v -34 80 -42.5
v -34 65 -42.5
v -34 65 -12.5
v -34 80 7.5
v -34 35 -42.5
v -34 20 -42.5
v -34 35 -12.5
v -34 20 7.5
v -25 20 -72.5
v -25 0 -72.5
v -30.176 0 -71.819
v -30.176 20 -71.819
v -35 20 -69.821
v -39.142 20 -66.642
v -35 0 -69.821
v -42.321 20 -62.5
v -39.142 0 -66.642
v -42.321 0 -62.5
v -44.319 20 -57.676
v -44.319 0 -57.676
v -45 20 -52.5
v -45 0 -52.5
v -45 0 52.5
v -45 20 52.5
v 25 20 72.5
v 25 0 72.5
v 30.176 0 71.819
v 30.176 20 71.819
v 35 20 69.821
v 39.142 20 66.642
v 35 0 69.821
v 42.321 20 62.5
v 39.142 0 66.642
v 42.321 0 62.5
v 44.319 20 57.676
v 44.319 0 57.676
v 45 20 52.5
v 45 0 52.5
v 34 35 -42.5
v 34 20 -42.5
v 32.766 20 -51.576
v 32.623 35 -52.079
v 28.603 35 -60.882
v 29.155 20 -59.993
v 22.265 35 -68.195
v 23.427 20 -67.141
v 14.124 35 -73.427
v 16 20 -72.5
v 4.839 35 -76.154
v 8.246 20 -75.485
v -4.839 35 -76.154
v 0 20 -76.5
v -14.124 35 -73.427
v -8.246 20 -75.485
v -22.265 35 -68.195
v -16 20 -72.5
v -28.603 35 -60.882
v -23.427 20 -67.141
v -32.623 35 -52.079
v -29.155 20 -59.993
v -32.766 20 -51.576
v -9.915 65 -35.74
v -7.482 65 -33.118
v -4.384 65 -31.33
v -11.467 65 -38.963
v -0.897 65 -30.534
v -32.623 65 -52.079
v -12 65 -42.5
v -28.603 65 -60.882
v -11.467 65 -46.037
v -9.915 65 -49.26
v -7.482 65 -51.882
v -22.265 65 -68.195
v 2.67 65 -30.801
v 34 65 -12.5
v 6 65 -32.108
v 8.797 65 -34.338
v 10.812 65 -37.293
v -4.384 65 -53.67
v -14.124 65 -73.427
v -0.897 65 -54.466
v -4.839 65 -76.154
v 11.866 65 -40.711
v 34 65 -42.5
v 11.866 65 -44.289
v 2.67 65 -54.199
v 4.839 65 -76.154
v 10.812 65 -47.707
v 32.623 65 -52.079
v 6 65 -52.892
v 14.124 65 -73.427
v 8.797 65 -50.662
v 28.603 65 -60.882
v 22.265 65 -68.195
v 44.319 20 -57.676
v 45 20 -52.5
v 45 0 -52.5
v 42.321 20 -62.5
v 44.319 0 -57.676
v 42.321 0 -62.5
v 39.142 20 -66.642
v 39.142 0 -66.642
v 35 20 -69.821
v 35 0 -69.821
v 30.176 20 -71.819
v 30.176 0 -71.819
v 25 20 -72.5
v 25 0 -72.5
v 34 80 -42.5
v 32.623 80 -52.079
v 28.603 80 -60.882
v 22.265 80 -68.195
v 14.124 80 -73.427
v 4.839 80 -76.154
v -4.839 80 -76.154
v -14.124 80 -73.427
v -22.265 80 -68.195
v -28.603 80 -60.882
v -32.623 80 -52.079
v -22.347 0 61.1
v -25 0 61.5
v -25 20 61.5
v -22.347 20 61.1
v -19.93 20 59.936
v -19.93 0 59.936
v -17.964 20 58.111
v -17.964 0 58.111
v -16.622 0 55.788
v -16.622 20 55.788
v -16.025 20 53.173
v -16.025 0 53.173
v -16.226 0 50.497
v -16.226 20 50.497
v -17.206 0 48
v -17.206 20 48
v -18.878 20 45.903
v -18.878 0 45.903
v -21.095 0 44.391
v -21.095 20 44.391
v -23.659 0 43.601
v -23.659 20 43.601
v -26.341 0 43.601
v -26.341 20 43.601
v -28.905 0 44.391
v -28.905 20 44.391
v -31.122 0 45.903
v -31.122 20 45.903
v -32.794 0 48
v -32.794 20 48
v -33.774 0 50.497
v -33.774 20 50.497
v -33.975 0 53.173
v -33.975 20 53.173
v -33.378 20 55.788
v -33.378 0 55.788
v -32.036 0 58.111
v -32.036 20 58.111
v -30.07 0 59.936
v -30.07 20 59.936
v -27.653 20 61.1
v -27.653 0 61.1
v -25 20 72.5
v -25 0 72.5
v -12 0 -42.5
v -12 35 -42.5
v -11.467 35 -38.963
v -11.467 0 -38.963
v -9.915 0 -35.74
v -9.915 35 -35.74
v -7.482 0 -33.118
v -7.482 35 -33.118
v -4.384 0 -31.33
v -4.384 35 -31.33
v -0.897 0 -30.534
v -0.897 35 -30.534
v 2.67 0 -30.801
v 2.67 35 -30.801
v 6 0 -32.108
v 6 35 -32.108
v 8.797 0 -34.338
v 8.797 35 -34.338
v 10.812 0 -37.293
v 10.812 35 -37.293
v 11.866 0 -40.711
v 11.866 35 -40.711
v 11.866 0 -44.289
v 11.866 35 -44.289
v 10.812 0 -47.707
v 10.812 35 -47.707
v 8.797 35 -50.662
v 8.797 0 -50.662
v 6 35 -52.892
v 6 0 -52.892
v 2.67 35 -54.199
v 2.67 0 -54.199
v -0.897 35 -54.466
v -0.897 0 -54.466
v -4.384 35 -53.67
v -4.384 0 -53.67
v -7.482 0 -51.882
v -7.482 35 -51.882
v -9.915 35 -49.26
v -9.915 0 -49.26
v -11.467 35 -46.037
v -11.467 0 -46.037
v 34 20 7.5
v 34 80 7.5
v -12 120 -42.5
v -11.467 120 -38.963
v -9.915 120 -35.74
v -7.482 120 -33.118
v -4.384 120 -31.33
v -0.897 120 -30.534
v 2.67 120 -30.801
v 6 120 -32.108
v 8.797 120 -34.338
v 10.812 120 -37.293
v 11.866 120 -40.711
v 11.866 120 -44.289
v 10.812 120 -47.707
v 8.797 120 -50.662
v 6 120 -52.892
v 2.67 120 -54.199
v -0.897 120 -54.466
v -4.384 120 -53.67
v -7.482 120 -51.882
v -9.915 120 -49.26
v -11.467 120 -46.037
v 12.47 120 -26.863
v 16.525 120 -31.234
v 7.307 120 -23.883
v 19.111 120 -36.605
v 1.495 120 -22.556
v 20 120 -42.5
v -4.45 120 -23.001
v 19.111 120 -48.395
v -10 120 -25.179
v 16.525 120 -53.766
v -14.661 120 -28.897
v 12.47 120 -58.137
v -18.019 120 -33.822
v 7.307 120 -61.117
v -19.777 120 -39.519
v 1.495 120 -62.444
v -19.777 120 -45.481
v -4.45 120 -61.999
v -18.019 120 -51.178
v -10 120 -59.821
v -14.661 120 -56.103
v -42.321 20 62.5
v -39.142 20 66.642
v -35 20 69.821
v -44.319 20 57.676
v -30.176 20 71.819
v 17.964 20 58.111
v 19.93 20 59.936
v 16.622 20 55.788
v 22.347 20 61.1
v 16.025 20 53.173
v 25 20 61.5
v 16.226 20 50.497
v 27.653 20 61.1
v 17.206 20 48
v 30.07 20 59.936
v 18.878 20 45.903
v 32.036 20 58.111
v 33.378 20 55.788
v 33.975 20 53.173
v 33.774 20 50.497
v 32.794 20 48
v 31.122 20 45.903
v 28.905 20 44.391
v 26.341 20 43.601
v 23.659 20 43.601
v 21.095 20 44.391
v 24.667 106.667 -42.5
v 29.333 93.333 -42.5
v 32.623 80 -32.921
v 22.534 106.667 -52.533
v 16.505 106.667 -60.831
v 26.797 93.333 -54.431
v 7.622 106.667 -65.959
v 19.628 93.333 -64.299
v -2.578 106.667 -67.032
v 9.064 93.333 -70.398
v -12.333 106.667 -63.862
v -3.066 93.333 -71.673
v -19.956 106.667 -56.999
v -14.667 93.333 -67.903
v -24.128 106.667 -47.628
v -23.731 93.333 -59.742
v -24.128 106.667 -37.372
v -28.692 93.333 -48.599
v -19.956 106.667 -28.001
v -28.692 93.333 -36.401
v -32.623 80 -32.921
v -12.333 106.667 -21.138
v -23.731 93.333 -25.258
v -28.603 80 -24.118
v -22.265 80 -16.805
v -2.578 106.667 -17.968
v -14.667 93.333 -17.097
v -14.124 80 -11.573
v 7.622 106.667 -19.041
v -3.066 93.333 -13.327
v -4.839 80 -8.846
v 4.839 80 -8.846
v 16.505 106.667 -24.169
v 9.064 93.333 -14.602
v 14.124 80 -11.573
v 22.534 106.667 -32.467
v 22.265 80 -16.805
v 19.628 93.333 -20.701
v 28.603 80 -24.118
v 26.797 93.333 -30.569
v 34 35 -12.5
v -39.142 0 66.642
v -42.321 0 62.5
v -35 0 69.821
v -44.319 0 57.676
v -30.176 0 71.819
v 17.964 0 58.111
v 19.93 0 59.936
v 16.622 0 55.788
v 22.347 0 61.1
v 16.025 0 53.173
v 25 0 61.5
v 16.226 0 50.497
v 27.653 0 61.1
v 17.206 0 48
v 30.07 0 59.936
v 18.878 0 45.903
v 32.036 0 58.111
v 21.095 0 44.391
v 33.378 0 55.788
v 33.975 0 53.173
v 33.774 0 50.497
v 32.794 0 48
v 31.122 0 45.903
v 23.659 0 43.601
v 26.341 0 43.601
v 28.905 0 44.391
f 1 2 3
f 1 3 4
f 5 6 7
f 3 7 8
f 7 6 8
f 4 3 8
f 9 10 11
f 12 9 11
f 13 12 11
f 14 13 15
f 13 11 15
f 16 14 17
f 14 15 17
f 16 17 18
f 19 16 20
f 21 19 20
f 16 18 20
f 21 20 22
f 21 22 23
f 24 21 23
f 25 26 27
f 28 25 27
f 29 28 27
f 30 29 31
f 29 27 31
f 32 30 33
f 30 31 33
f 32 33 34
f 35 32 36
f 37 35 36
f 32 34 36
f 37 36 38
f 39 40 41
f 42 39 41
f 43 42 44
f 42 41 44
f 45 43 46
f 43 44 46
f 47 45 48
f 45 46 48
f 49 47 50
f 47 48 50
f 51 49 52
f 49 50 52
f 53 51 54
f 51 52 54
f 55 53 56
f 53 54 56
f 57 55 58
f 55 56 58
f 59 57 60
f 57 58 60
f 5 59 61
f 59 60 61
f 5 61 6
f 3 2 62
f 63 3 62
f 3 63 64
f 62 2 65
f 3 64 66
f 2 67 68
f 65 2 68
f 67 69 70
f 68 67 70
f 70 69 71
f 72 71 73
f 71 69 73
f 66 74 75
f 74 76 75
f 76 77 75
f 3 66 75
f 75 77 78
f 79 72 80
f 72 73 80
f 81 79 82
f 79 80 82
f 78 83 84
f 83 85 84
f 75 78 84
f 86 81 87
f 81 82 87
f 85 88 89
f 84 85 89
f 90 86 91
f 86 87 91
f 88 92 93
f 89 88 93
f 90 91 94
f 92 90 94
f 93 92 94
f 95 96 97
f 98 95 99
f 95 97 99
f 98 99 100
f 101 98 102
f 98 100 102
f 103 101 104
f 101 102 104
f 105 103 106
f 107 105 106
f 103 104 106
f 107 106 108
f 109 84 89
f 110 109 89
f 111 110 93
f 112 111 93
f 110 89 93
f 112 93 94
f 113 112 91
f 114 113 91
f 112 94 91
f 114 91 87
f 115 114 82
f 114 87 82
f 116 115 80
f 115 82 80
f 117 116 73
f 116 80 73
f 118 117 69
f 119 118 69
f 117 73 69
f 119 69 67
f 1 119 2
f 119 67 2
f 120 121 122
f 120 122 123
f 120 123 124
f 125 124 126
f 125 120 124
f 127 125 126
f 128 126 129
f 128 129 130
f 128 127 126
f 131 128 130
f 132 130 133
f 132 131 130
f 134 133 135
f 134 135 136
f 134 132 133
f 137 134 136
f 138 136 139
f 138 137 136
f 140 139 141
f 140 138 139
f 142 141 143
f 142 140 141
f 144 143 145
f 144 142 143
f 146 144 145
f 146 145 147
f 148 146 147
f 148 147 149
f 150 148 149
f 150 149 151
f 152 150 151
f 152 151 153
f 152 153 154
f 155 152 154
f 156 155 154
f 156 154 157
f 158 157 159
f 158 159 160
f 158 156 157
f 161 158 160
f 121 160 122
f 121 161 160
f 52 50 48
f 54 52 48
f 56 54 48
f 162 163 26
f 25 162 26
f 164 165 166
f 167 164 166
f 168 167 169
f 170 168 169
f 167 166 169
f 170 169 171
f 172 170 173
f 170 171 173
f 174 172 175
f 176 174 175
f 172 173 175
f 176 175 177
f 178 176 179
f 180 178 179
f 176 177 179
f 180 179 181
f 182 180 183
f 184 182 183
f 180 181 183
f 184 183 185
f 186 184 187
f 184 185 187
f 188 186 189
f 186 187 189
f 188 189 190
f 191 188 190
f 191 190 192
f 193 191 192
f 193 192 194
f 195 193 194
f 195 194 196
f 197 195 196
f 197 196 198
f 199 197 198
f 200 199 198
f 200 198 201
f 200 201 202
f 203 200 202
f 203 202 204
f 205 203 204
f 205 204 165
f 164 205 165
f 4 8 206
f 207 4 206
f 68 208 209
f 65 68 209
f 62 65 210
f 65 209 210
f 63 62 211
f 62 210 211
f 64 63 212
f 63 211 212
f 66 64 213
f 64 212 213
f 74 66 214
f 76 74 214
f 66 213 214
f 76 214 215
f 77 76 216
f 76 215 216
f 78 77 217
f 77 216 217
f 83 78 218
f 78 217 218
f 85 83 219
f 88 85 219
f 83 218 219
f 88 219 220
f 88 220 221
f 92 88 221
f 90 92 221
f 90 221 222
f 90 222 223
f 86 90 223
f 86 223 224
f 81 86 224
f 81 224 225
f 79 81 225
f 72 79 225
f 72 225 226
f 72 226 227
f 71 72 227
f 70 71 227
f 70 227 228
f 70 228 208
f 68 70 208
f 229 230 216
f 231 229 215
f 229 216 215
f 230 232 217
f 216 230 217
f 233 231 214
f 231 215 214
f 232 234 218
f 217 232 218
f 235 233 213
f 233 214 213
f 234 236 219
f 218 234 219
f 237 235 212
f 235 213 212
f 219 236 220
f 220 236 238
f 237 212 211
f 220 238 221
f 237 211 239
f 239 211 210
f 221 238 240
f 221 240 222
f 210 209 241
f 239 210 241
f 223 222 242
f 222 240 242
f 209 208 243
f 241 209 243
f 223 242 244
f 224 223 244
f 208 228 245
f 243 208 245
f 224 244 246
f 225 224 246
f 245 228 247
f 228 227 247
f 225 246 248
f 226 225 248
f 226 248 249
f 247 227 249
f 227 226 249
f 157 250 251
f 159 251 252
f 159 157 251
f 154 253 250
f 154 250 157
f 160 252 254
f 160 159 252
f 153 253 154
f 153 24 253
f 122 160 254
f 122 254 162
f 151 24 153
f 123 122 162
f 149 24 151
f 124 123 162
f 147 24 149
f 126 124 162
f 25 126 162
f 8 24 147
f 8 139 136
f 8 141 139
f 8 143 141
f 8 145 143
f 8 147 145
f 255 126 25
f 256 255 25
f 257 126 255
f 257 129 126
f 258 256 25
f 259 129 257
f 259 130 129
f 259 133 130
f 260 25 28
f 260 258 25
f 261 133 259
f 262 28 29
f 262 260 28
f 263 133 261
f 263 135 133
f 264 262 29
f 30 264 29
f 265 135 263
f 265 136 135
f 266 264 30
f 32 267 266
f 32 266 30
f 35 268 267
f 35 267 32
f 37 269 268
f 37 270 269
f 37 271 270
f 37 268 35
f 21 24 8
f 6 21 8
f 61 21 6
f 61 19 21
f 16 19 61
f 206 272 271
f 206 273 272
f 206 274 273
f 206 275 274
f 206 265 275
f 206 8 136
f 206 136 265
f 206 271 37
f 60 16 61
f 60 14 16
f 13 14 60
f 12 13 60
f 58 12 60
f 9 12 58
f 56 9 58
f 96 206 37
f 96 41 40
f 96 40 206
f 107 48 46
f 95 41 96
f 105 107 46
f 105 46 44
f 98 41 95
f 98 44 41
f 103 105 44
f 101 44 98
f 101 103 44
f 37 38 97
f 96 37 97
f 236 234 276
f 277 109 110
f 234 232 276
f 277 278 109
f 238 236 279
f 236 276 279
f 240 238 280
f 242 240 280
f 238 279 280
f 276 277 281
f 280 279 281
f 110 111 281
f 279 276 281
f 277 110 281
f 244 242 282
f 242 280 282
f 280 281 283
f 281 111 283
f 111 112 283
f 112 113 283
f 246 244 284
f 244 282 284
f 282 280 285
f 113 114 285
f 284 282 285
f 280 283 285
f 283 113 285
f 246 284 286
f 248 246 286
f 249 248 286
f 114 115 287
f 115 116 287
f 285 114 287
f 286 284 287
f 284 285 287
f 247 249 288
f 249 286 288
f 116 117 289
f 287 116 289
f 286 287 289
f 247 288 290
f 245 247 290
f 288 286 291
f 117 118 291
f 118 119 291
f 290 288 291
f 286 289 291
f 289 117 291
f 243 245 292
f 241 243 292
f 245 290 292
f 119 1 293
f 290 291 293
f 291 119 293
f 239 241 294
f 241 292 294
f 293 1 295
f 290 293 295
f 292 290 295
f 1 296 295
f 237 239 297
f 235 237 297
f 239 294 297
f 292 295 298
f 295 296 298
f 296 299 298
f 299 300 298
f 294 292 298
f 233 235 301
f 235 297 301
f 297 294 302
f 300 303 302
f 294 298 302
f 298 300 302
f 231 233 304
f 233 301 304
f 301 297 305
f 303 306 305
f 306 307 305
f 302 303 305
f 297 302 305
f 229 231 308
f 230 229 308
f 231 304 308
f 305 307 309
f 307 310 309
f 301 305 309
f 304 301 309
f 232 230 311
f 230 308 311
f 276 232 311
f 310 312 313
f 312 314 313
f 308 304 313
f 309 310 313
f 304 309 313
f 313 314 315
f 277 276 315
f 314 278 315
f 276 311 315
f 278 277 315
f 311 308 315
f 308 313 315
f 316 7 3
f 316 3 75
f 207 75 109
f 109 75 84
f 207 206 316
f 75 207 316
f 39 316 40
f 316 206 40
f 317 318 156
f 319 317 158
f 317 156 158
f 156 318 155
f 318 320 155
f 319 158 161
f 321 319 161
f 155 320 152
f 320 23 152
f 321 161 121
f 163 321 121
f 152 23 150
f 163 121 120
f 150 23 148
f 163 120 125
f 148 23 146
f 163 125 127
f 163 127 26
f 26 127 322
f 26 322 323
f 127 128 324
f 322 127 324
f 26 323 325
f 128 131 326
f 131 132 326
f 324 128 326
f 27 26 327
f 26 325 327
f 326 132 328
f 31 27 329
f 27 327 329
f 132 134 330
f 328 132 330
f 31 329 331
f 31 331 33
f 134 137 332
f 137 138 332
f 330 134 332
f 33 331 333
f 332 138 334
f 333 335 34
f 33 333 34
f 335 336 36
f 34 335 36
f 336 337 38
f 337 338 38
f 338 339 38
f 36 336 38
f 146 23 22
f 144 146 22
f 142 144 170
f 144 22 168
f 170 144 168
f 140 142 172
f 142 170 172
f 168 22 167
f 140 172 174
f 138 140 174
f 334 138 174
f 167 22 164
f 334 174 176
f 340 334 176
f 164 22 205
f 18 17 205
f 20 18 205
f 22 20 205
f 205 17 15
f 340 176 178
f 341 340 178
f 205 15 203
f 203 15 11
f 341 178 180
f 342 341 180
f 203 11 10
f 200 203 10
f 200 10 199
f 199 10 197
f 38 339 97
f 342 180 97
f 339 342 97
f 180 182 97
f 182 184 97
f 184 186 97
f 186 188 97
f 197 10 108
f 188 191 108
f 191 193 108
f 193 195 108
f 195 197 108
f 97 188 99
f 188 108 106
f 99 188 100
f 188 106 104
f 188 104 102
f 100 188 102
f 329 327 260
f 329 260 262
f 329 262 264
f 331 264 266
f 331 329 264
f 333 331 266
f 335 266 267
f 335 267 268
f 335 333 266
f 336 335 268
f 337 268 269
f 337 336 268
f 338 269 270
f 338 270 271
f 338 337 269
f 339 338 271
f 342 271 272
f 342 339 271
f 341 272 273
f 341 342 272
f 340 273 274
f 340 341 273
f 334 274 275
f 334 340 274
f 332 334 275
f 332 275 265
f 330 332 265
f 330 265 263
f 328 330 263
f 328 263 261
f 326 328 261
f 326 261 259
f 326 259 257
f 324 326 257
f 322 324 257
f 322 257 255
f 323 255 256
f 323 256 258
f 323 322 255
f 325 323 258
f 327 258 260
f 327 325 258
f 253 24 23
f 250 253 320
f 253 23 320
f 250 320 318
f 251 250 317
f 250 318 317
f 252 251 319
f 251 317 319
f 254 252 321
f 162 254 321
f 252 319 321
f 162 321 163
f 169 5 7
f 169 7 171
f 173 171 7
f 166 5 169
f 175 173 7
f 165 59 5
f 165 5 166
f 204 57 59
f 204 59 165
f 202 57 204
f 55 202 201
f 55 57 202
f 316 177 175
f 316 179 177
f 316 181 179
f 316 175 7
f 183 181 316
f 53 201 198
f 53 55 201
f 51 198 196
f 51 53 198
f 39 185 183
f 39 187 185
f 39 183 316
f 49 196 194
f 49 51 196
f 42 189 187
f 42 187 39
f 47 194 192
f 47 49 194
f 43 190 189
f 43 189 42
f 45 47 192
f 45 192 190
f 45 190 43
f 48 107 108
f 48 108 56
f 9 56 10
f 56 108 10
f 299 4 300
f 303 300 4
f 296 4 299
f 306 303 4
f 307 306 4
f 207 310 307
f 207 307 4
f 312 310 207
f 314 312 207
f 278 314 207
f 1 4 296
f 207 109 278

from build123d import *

# Parameters (mm, degrees)
SKETCH1_R           = 9
BOSS_EXTRUDE1_DEPTH = 20
BOSS_EXTRUDE4_DEPTH = 60
CUT_EXTRUDE1_START  = -45
CUT_EXTRUDE1_DEPTH  = 30
SKETCH9_R           = 12
CUT_EXTRUDE2_DEPTH  = 150.255653159


with BuildPart() as part:
    # Sketch1 → Boss-Extrude1 (new body)
    with BuildSketch(Plane(origin=(0, 0, 0), x_dir=(1, 0, 0), z_dir=(0, 1, 0))):
        with BuildLine():
            Line((-25, -72.5), (25, -72.5))
            ThreePointArc((25, -72.5), (39.142135624, -66.642135624), (45, -52.5))
            Line((45, -52.5), (45, 52.5))
            ThreePointArc((45, 52.5), (39.142135624, 66.642135624), (25, 72.5))
            Line((25, 72.5), (-25, 72.5))
            ThreePointArc((-25, 72.5), (-39.142135624, 66.642135624), (-45, 52.5))
            Line((-45, 52.5), (-45, -52.5))
            ThreePointArc((-45, -52.5), (-39.142135624, -66.642135624), (-25, -72.5))
        make_face()
        with Locations(Location((25, -52.5, 0), (0, 0, 270))):
            Circle(SKETCH1_R, mode=Mode.SUBTRACT)
        with Locations(Location((-25, -52.5, 0), (0, 0, 270))):
            Circle(SKETCH1_R, mode=Mode.SUBTRACT)
    extrude(amount=BOSS_EXTRUDE1_DEPTH)

    # Sketch4 → Boss-Extrude4 (add)
    with BuildSketch(Plane(origin=(0, 20, 0), x_dir=(1, 0, 0), z_dir=(0, 1, 0))):
        with BuildLine():
            Line((-34, -7.5), (34, -7.5))
            Line((34, -7.5), (34, 42.5))
            ThreePointArc((34, 42.5), (0, 76.5), (-34, 42.5))
            Line((-34, 42.5), (-34, -7.5))
        make_face()
    extrude(amount=BOSS_EXTRUDE4_DEPTH)

    # Sketch6 → Cut-Extrude1 (cut)
    with BuildSketch(Plane(origin=(0, 80, 0), x_dir=(1, 0, 0), z_dir=(0, 1, 0)).offset(CUT_EXTRUDE1_START)):
        with BuildLine():
            Line((-34, 12.5), (34, 12.5))
            Line((34, 12.5), (34, 42.5))
            ThreePointArc((34, 42.5), (0, 76.5), (-34, 42.5))
            Line((-34, 42.5), (-34, 12.5))
        make_face()
    extrude(amount=CUT_EXTRUDE1_DEPTH, mode=Mode.SUBTRACT)

    # Sketch7 → Revolve1 (revolve)
    with BuildSketch(Plane.XY.offset(-42.5)):
        Polygon((0, 120), (20, 120), (34, 80), (0, 80), align=None)
    revolve(axis=Axis((0, 80, -42.5), (0, 1, 0)))

    # Sketch9 → Cut-Extrude2 (cut, through all)
    with BuildSketch(Plane(origin=(0, 120, 0), x_dir=(1, 0, 0), z_dir=(0, 1, 0))):
        with Locations(Location((0, 42.5, 0), (0, 0, 180))):
            Circle(SKETCH9_R)
    extrude(amount=-CUT_EXTRUDE2_DEPTH, mode=Mode.SUBTRACT)


solid = part.part
